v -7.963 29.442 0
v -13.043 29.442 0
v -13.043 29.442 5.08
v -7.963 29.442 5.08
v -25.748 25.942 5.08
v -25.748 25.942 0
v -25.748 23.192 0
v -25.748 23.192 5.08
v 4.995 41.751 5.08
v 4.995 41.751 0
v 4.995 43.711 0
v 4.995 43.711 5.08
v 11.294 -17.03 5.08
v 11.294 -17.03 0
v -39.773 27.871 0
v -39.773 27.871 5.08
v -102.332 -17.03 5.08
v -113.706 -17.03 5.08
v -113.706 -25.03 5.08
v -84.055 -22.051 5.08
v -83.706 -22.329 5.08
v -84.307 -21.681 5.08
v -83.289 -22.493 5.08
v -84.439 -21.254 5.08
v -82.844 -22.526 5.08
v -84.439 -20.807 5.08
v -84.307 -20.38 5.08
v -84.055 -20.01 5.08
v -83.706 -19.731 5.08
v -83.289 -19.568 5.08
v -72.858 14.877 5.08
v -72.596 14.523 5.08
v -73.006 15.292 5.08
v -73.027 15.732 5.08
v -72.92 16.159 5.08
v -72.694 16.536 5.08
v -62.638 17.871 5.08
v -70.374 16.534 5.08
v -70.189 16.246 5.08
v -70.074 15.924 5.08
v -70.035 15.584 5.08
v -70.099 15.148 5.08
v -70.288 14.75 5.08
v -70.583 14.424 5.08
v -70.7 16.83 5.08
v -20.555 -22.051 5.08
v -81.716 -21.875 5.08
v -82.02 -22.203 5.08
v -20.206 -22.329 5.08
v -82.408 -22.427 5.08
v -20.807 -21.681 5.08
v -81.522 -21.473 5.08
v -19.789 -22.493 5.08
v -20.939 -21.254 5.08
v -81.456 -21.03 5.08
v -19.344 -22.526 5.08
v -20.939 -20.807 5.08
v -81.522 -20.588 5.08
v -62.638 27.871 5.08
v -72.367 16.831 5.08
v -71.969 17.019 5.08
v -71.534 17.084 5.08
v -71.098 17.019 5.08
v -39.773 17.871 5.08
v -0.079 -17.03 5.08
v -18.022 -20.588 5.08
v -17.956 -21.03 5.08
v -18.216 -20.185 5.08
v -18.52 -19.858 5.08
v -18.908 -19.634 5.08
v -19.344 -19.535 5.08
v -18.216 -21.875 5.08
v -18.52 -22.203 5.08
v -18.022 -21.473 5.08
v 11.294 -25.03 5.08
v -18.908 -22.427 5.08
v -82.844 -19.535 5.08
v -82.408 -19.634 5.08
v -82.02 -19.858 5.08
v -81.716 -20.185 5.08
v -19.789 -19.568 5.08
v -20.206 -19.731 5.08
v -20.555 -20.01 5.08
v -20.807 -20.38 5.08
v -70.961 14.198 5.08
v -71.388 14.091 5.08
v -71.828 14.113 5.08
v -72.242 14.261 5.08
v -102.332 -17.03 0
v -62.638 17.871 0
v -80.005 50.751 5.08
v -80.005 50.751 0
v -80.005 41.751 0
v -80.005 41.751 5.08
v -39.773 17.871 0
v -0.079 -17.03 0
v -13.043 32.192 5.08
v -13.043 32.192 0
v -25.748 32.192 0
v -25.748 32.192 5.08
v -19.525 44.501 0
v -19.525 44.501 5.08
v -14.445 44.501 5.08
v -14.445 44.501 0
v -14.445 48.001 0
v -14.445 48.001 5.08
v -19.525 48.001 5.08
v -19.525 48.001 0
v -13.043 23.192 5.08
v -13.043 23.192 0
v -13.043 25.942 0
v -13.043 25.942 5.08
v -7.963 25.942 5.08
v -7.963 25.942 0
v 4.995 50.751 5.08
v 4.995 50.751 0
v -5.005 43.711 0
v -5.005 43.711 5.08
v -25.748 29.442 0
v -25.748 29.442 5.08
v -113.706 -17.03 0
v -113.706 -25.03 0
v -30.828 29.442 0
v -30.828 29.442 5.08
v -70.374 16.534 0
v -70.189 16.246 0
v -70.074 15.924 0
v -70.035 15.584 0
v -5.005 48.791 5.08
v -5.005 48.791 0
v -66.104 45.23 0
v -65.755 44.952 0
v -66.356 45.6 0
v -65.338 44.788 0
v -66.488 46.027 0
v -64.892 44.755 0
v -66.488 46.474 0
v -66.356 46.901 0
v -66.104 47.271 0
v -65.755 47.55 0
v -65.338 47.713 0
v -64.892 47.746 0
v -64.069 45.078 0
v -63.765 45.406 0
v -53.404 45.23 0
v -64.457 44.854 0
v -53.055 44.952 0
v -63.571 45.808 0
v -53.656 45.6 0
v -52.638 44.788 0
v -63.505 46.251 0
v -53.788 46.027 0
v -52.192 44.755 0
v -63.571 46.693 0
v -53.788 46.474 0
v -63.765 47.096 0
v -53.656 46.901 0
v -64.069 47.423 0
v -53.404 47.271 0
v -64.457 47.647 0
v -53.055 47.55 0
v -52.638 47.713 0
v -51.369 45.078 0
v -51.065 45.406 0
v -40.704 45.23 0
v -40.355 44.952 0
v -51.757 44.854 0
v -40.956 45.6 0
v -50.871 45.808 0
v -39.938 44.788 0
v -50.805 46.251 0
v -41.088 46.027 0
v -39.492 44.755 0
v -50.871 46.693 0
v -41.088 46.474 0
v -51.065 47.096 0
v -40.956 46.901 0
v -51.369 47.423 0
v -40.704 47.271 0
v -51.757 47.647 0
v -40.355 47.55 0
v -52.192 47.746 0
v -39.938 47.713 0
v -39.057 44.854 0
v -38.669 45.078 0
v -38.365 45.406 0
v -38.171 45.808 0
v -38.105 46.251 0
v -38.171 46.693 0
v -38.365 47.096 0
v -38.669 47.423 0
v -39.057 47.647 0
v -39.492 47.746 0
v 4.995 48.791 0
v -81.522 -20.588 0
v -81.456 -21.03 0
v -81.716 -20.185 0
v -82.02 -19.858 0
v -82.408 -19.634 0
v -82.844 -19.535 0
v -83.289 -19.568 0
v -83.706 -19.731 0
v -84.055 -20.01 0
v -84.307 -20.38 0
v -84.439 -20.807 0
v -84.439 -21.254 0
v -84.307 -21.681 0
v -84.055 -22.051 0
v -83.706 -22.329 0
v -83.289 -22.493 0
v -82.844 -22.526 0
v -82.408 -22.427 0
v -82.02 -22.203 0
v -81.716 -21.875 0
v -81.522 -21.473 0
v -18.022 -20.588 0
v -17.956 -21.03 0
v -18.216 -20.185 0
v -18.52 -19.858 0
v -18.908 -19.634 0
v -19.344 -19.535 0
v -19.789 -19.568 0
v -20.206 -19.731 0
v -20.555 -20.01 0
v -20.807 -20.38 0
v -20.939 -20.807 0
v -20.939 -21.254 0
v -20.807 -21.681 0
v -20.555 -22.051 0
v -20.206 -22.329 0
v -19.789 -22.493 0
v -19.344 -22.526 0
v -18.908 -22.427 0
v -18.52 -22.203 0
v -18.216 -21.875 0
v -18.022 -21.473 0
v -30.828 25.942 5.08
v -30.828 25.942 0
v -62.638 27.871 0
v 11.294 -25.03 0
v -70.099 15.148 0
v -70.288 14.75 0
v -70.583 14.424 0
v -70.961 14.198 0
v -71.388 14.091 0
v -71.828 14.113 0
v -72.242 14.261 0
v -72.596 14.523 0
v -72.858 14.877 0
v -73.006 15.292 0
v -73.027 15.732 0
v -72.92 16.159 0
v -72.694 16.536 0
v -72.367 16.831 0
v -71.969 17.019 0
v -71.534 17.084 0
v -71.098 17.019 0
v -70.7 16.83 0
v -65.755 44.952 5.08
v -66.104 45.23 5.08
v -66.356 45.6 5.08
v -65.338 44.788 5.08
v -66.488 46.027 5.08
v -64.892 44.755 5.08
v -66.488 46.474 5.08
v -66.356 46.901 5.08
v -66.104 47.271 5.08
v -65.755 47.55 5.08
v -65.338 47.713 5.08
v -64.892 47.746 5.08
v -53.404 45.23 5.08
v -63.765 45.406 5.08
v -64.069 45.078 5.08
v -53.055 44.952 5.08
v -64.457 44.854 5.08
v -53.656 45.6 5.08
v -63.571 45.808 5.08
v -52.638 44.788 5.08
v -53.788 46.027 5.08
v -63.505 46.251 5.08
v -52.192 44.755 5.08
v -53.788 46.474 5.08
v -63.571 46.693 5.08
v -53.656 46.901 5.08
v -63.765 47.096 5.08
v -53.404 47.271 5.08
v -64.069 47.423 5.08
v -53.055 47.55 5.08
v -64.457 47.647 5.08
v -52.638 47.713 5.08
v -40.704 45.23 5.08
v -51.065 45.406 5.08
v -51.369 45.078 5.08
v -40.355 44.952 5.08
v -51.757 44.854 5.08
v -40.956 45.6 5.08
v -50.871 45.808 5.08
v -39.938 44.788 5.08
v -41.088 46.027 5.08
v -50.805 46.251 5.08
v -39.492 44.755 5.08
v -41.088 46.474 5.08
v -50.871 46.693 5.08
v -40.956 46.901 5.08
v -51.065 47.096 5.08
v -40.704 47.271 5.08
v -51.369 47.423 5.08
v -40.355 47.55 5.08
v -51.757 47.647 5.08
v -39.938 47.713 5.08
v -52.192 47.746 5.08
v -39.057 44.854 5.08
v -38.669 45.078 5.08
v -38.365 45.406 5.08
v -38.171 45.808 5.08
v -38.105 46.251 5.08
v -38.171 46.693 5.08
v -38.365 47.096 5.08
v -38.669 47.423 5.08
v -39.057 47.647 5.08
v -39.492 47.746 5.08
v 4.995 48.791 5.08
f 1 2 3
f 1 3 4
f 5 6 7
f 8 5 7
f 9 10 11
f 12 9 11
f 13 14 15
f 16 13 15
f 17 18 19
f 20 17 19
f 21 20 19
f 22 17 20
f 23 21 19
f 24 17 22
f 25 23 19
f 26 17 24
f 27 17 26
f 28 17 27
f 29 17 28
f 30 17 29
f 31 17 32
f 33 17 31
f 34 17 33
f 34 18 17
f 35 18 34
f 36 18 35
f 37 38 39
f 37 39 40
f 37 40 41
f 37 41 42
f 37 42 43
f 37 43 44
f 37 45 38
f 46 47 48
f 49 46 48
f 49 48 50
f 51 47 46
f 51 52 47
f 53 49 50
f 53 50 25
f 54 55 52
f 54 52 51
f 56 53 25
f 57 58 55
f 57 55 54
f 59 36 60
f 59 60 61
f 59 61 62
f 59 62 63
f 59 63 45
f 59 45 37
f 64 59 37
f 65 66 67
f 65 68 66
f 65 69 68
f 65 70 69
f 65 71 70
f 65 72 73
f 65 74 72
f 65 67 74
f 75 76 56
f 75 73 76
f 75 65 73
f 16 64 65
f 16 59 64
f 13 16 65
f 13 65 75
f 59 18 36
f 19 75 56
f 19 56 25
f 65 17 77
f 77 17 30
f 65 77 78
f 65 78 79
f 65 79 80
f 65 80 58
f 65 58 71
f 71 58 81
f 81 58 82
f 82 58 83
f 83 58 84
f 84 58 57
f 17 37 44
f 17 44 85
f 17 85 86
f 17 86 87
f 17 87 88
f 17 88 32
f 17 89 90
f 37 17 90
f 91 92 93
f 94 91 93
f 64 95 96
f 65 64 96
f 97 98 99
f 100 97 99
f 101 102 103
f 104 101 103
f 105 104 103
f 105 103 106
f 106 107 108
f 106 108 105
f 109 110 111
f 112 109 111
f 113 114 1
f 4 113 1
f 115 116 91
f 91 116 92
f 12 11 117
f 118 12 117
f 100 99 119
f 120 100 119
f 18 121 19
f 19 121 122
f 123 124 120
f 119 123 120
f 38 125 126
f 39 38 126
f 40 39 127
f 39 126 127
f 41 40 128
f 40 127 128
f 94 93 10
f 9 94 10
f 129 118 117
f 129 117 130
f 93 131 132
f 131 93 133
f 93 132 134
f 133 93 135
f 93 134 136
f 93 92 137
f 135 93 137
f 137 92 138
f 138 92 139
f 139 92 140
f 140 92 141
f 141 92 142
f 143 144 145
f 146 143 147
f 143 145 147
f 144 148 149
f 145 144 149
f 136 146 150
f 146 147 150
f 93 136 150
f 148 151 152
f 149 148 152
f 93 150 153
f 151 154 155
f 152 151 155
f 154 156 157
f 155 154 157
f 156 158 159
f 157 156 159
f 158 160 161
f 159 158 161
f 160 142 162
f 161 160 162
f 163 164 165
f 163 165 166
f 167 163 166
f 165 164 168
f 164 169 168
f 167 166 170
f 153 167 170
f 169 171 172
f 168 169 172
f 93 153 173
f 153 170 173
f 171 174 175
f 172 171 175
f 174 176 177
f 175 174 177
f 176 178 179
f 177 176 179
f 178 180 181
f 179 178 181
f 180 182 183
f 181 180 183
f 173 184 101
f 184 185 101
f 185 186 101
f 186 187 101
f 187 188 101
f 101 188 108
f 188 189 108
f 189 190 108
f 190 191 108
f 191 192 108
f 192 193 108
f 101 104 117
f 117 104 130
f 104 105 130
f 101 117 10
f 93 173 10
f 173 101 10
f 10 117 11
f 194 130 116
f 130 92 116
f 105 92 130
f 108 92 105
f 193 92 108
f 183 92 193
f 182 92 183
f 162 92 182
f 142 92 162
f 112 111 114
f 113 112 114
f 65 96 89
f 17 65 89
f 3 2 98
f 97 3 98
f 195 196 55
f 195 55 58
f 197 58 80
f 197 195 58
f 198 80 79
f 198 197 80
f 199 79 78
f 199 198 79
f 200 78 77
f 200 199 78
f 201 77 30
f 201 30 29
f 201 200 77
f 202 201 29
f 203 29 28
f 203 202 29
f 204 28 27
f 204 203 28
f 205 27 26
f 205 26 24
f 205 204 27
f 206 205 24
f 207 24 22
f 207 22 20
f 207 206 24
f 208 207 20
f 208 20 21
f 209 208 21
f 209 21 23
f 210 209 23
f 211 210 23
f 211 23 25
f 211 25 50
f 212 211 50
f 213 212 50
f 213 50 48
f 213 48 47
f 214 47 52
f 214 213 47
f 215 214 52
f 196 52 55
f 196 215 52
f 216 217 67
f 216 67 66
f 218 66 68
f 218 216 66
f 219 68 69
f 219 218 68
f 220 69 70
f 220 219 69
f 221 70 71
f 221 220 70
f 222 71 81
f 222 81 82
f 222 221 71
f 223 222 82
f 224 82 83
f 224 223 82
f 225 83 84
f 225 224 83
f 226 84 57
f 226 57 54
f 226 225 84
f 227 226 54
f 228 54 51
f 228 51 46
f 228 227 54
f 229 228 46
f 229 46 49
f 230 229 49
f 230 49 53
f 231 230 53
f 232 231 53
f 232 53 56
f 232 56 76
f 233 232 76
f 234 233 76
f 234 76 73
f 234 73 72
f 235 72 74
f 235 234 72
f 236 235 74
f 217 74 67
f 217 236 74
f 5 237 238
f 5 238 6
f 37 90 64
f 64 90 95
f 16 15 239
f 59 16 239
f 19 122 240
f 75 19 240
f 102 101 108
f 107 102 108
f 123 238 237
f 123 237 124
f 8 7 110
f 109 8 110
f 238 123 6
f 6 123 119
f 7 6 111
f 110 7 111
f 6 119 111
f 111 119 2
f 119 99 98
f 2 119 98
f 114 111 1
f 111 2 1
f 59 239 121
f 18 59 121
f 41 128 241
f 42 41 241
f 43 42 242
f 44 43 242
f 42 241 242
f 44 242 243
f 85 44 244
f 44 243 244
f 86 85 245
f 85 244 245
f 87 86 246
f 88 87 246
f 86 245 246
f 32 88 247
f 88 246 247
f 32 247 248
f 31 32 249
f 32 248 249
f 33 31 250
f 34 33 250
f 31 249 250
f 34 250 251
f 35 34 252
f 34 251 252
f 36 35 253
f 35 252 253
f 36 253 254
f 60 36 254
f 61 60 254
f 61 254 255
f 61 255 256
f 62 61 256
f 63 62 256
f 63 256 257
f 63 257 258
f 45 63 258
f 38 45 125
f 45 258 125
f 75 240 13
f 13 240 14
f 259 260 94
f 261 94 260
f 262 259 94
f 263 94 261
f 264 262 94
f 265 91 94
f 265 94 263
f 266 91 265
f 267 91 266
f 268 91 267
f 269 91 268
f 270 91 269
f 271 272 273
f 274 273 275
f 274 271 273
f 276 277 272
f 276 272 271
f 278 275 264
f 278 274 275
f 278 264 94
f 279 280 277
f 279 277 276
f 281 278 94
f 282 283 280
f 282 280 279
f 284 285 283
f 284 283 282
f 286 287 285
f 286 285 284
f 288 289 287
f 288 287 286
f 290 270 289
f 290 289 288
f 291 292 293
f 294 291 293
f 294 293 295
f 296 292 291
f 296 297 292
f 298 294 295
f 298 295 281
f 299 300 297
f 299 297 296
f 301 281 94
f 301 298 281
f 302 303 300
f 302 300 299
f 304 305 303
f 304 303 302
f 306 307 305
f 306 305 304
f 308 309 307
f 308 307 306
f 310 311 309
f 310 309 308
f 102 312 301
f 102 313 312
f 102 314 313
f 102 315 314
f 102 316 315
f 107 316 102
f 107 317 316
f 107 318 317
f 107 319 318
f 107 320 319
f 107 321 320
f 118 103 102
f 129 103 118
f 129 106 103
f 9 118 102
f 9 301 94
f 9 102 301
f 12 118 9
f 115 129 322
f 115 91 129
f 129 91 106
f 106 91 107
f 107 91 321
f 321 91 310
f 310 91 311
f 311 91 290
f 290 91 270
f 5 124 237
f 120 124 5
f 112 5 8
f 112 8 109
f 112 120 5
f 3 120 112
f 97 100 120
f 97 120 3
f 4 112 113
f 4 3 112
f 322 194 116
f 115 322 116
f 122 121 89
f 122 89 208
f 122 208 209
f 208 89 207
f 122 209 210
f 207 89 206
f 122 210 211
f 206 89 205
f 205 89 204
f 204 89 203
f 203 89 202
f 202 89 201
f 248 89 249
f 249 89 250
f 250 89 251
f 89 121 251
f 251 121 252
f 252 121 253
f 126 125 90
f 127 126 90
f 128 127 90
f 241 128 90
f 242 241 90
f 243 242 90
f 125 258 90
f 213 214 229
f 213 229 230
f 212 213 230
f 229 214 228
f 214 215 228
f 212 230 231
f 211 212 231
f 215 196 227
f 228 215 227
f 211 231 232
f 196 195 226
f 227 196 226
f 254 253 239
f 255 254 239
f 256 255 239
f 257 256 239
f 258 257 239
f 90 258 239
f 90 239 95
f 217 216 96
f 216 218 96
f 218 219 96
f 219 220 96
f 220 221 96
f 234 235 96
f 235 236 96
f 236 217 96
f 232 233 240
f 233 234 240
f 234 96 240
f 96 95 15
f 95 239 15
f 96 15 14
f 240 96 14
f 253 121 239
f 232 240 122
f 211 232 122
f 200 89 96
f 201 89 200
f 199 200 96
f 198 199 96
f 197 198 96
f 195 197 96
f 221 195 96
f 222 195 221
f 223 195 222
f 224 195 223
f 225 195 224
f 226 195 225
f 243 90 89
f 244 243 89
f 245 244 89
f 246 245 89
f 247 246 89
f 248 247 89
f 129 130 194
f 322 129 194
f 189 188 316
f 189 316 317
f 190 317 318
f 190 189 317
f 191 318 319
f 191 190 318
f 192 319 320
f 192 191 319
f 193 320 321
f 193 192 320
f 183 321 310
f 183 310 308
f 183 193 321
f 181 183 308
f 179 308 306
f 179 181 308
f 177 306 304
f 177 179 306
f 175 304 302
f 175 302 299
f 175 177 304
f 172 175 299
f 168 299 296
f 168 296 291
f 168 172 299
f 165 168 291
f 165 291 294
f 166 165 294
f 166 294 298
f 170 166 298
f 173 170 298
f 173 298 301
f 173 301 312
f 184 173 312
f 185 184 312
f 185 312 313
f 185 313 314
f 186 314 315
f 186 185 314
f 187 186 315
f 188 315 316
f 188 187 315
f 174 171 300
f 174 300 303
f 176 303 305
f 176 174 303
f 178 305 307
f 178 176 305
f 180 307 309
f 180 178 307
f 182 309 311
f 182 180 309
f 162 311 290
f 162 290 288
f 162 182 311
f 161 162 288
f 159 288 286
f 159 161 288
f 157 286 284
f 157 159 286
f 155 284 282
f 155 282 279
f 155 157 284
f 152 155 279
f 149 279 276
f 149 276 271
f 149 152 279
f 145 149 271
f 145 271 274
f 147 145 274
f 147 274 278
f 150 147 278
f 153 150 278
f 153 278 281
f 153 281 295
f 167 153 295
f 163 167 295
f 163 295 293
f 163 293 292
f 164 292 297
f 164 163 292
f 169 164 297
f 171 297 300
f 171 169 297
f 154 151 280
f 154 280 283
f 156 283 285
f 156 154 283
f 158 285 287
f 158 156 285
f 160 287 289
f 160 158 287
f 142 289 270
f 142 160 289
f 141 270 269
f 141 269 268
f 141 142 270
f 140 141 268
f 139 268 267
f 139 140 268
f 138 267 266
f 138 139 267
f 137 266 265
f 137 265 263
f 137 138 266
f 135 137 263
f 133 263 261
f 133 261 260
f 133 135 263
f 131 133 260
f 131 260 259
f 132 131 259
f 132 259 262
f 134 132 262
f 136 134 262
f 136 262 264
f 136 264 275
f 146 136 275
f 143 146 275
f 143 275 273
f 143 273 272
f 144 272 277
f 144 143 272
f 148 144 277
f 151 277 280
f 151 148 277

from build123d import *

# Parameters (mm, degrees)
F0_R     = 1.5
F0_W     = 5.08
F0_H     = 3.5
F1_DEPTH = 5.08
F0_W_2   = 11.4325
F0_H_2   = 10


# Not quite as in the source:
# - a feature names something its author has since deleted; it is built from what else it names


with BuildPart() as f1:
    # F0 (on Top) → F1 (new body)
    with BuildSketch(Plane.XY):
        Polygon((4.9954398084, 48.7905830651), (4.9954398084, 50.7505830651), (-80.0045601916, 50.7505830651), (-80.0045601916, 41.7505830651), (4.9954398084, 41.7505830651), (4.9954398084, 43.7105830651), (-5.0045601916, 43.7105830651), (-5.0045601916, 48.7905830651), align=None)
        with Locations((-65.0045601916, 46.2505830651)):
            Circle(F0_R, mode=Mode.SUBTRACT)
        with Locations((-52.3045601916, 46.2505830651)):
            Circle(F0_R, mode=Mode.SUBTRACT)
        with Locations((-39.6045601916, 46.2505830651)):
            Circle(F0_R, mode=Mode.SUBTRACT)
        with Locations((-16.9845601916, 46.2505830651)):
            Rectangle(F0_W, F0_H, mode=Mode.SUBTRACT)
    extrude(amount=F1_DEPTH)


with BuildPart() as f1b:
    # F0 (on Top) → F1, piece 2 (new body)
    with BuildSketch(Plane.XY):
        Polygon((-19.3953289995, 32.1917034835), (-25.7478289995, 32.1917034835), (-25.7478289995, 29.4417034835), (-25.7478289995, 25.9417034835), (-25.7478289995, 23.1917034835), (-19.3953289995, 23.1917034835), align=None)
        with Locations((-28.2878289995, 27.6917034835)):
            Rectangle(F0_W, F0_H)
        Polygon((-13.0428289995, 32.1917034835), (-19.3953289995, 32.1917034835), (-19.3953289995, 23.1917034835), (-13.0428289995, 23.1917034835), (-13.0428289995, 25.9417034835), (-13.0428289995, 29.4417034835), align=None)
        with Locations((-10.5028289995, 27.6917034835)):
            Rectangle(F0_W, F0_H)
    extrude(amount=F1_DEPTH)


with BuildPart() as f1c:
    # F0 (on Top) → F1, piece 3 (new body)
    with BuildSketch(Plane.XY):
        Polygon((-51.2056094673, 27.870685693), (-62.6381094673, 27.870685693), (-62.6381094673, 22.870685693), (-62.6381094673, 17.870685693), (-51.2056094673, 17.870685693), align=None)
        with Locations((-45.4893594673, 22.870685693)):
            Rectangle(F0_W_2, F0_H_2)
        Polygon((-62.6381094673, 22.870685693), (-62.6381094673, 27.870685693), (-113.7056094673, -17.0304328203), (-102.3322847728, -17.0304328203), (-62.6381094673, 17.870685693), align=None)
        with BuildLine():
            ThreePointArc((-70.0347154799, 15.5836834659), (-72.9472734976, 15.0790253177), (-70.3742886087, 16.5341620173))
            ThreePointArc((-70.3742886087, 16.5341620173), (-70.1221574622, 16.0883416142), (-70.0347154799, 15.5836834659))
        make_face(mode=Mode.SUBTRACT)
        Polygon((11.2943905327, -17.0304328203), (-39.7731094673, 27.870685693), (-39.7731094673, 17.870685693), (-0.0789341619, -17.0304328203), align=None)
        Polygon((-102.3322847728, -17.0304328203), (-113.7056094673, -17.0304328203), (-113.7056094673, -25.0304328203), (-51.2056094673, -25.0304328203), (-51.2056094673, -17.0304328203), align=None)
        with Locations((-82.9556094673, -21.0304328203)):
            Circle(F0_R, mode=Mode.SUBTRACT)
        Polygon((11.2943905327, -25.0304328203), (11.2943905327, -17.0304328203), (-0.0789341619, -17.0304328203), (-51.2056094673, -17.0304328203), (-51.2056094673, -25.0304328203), align=None)
        with Locations((-19.4556094673, -21.0304328203)):
            Circle(F0_R, mode=Mode.SUBTRACT)
    extrude(amount=F1_DEPTH)


solid = Compound([f1.part, f1b.part, f1c.part])
